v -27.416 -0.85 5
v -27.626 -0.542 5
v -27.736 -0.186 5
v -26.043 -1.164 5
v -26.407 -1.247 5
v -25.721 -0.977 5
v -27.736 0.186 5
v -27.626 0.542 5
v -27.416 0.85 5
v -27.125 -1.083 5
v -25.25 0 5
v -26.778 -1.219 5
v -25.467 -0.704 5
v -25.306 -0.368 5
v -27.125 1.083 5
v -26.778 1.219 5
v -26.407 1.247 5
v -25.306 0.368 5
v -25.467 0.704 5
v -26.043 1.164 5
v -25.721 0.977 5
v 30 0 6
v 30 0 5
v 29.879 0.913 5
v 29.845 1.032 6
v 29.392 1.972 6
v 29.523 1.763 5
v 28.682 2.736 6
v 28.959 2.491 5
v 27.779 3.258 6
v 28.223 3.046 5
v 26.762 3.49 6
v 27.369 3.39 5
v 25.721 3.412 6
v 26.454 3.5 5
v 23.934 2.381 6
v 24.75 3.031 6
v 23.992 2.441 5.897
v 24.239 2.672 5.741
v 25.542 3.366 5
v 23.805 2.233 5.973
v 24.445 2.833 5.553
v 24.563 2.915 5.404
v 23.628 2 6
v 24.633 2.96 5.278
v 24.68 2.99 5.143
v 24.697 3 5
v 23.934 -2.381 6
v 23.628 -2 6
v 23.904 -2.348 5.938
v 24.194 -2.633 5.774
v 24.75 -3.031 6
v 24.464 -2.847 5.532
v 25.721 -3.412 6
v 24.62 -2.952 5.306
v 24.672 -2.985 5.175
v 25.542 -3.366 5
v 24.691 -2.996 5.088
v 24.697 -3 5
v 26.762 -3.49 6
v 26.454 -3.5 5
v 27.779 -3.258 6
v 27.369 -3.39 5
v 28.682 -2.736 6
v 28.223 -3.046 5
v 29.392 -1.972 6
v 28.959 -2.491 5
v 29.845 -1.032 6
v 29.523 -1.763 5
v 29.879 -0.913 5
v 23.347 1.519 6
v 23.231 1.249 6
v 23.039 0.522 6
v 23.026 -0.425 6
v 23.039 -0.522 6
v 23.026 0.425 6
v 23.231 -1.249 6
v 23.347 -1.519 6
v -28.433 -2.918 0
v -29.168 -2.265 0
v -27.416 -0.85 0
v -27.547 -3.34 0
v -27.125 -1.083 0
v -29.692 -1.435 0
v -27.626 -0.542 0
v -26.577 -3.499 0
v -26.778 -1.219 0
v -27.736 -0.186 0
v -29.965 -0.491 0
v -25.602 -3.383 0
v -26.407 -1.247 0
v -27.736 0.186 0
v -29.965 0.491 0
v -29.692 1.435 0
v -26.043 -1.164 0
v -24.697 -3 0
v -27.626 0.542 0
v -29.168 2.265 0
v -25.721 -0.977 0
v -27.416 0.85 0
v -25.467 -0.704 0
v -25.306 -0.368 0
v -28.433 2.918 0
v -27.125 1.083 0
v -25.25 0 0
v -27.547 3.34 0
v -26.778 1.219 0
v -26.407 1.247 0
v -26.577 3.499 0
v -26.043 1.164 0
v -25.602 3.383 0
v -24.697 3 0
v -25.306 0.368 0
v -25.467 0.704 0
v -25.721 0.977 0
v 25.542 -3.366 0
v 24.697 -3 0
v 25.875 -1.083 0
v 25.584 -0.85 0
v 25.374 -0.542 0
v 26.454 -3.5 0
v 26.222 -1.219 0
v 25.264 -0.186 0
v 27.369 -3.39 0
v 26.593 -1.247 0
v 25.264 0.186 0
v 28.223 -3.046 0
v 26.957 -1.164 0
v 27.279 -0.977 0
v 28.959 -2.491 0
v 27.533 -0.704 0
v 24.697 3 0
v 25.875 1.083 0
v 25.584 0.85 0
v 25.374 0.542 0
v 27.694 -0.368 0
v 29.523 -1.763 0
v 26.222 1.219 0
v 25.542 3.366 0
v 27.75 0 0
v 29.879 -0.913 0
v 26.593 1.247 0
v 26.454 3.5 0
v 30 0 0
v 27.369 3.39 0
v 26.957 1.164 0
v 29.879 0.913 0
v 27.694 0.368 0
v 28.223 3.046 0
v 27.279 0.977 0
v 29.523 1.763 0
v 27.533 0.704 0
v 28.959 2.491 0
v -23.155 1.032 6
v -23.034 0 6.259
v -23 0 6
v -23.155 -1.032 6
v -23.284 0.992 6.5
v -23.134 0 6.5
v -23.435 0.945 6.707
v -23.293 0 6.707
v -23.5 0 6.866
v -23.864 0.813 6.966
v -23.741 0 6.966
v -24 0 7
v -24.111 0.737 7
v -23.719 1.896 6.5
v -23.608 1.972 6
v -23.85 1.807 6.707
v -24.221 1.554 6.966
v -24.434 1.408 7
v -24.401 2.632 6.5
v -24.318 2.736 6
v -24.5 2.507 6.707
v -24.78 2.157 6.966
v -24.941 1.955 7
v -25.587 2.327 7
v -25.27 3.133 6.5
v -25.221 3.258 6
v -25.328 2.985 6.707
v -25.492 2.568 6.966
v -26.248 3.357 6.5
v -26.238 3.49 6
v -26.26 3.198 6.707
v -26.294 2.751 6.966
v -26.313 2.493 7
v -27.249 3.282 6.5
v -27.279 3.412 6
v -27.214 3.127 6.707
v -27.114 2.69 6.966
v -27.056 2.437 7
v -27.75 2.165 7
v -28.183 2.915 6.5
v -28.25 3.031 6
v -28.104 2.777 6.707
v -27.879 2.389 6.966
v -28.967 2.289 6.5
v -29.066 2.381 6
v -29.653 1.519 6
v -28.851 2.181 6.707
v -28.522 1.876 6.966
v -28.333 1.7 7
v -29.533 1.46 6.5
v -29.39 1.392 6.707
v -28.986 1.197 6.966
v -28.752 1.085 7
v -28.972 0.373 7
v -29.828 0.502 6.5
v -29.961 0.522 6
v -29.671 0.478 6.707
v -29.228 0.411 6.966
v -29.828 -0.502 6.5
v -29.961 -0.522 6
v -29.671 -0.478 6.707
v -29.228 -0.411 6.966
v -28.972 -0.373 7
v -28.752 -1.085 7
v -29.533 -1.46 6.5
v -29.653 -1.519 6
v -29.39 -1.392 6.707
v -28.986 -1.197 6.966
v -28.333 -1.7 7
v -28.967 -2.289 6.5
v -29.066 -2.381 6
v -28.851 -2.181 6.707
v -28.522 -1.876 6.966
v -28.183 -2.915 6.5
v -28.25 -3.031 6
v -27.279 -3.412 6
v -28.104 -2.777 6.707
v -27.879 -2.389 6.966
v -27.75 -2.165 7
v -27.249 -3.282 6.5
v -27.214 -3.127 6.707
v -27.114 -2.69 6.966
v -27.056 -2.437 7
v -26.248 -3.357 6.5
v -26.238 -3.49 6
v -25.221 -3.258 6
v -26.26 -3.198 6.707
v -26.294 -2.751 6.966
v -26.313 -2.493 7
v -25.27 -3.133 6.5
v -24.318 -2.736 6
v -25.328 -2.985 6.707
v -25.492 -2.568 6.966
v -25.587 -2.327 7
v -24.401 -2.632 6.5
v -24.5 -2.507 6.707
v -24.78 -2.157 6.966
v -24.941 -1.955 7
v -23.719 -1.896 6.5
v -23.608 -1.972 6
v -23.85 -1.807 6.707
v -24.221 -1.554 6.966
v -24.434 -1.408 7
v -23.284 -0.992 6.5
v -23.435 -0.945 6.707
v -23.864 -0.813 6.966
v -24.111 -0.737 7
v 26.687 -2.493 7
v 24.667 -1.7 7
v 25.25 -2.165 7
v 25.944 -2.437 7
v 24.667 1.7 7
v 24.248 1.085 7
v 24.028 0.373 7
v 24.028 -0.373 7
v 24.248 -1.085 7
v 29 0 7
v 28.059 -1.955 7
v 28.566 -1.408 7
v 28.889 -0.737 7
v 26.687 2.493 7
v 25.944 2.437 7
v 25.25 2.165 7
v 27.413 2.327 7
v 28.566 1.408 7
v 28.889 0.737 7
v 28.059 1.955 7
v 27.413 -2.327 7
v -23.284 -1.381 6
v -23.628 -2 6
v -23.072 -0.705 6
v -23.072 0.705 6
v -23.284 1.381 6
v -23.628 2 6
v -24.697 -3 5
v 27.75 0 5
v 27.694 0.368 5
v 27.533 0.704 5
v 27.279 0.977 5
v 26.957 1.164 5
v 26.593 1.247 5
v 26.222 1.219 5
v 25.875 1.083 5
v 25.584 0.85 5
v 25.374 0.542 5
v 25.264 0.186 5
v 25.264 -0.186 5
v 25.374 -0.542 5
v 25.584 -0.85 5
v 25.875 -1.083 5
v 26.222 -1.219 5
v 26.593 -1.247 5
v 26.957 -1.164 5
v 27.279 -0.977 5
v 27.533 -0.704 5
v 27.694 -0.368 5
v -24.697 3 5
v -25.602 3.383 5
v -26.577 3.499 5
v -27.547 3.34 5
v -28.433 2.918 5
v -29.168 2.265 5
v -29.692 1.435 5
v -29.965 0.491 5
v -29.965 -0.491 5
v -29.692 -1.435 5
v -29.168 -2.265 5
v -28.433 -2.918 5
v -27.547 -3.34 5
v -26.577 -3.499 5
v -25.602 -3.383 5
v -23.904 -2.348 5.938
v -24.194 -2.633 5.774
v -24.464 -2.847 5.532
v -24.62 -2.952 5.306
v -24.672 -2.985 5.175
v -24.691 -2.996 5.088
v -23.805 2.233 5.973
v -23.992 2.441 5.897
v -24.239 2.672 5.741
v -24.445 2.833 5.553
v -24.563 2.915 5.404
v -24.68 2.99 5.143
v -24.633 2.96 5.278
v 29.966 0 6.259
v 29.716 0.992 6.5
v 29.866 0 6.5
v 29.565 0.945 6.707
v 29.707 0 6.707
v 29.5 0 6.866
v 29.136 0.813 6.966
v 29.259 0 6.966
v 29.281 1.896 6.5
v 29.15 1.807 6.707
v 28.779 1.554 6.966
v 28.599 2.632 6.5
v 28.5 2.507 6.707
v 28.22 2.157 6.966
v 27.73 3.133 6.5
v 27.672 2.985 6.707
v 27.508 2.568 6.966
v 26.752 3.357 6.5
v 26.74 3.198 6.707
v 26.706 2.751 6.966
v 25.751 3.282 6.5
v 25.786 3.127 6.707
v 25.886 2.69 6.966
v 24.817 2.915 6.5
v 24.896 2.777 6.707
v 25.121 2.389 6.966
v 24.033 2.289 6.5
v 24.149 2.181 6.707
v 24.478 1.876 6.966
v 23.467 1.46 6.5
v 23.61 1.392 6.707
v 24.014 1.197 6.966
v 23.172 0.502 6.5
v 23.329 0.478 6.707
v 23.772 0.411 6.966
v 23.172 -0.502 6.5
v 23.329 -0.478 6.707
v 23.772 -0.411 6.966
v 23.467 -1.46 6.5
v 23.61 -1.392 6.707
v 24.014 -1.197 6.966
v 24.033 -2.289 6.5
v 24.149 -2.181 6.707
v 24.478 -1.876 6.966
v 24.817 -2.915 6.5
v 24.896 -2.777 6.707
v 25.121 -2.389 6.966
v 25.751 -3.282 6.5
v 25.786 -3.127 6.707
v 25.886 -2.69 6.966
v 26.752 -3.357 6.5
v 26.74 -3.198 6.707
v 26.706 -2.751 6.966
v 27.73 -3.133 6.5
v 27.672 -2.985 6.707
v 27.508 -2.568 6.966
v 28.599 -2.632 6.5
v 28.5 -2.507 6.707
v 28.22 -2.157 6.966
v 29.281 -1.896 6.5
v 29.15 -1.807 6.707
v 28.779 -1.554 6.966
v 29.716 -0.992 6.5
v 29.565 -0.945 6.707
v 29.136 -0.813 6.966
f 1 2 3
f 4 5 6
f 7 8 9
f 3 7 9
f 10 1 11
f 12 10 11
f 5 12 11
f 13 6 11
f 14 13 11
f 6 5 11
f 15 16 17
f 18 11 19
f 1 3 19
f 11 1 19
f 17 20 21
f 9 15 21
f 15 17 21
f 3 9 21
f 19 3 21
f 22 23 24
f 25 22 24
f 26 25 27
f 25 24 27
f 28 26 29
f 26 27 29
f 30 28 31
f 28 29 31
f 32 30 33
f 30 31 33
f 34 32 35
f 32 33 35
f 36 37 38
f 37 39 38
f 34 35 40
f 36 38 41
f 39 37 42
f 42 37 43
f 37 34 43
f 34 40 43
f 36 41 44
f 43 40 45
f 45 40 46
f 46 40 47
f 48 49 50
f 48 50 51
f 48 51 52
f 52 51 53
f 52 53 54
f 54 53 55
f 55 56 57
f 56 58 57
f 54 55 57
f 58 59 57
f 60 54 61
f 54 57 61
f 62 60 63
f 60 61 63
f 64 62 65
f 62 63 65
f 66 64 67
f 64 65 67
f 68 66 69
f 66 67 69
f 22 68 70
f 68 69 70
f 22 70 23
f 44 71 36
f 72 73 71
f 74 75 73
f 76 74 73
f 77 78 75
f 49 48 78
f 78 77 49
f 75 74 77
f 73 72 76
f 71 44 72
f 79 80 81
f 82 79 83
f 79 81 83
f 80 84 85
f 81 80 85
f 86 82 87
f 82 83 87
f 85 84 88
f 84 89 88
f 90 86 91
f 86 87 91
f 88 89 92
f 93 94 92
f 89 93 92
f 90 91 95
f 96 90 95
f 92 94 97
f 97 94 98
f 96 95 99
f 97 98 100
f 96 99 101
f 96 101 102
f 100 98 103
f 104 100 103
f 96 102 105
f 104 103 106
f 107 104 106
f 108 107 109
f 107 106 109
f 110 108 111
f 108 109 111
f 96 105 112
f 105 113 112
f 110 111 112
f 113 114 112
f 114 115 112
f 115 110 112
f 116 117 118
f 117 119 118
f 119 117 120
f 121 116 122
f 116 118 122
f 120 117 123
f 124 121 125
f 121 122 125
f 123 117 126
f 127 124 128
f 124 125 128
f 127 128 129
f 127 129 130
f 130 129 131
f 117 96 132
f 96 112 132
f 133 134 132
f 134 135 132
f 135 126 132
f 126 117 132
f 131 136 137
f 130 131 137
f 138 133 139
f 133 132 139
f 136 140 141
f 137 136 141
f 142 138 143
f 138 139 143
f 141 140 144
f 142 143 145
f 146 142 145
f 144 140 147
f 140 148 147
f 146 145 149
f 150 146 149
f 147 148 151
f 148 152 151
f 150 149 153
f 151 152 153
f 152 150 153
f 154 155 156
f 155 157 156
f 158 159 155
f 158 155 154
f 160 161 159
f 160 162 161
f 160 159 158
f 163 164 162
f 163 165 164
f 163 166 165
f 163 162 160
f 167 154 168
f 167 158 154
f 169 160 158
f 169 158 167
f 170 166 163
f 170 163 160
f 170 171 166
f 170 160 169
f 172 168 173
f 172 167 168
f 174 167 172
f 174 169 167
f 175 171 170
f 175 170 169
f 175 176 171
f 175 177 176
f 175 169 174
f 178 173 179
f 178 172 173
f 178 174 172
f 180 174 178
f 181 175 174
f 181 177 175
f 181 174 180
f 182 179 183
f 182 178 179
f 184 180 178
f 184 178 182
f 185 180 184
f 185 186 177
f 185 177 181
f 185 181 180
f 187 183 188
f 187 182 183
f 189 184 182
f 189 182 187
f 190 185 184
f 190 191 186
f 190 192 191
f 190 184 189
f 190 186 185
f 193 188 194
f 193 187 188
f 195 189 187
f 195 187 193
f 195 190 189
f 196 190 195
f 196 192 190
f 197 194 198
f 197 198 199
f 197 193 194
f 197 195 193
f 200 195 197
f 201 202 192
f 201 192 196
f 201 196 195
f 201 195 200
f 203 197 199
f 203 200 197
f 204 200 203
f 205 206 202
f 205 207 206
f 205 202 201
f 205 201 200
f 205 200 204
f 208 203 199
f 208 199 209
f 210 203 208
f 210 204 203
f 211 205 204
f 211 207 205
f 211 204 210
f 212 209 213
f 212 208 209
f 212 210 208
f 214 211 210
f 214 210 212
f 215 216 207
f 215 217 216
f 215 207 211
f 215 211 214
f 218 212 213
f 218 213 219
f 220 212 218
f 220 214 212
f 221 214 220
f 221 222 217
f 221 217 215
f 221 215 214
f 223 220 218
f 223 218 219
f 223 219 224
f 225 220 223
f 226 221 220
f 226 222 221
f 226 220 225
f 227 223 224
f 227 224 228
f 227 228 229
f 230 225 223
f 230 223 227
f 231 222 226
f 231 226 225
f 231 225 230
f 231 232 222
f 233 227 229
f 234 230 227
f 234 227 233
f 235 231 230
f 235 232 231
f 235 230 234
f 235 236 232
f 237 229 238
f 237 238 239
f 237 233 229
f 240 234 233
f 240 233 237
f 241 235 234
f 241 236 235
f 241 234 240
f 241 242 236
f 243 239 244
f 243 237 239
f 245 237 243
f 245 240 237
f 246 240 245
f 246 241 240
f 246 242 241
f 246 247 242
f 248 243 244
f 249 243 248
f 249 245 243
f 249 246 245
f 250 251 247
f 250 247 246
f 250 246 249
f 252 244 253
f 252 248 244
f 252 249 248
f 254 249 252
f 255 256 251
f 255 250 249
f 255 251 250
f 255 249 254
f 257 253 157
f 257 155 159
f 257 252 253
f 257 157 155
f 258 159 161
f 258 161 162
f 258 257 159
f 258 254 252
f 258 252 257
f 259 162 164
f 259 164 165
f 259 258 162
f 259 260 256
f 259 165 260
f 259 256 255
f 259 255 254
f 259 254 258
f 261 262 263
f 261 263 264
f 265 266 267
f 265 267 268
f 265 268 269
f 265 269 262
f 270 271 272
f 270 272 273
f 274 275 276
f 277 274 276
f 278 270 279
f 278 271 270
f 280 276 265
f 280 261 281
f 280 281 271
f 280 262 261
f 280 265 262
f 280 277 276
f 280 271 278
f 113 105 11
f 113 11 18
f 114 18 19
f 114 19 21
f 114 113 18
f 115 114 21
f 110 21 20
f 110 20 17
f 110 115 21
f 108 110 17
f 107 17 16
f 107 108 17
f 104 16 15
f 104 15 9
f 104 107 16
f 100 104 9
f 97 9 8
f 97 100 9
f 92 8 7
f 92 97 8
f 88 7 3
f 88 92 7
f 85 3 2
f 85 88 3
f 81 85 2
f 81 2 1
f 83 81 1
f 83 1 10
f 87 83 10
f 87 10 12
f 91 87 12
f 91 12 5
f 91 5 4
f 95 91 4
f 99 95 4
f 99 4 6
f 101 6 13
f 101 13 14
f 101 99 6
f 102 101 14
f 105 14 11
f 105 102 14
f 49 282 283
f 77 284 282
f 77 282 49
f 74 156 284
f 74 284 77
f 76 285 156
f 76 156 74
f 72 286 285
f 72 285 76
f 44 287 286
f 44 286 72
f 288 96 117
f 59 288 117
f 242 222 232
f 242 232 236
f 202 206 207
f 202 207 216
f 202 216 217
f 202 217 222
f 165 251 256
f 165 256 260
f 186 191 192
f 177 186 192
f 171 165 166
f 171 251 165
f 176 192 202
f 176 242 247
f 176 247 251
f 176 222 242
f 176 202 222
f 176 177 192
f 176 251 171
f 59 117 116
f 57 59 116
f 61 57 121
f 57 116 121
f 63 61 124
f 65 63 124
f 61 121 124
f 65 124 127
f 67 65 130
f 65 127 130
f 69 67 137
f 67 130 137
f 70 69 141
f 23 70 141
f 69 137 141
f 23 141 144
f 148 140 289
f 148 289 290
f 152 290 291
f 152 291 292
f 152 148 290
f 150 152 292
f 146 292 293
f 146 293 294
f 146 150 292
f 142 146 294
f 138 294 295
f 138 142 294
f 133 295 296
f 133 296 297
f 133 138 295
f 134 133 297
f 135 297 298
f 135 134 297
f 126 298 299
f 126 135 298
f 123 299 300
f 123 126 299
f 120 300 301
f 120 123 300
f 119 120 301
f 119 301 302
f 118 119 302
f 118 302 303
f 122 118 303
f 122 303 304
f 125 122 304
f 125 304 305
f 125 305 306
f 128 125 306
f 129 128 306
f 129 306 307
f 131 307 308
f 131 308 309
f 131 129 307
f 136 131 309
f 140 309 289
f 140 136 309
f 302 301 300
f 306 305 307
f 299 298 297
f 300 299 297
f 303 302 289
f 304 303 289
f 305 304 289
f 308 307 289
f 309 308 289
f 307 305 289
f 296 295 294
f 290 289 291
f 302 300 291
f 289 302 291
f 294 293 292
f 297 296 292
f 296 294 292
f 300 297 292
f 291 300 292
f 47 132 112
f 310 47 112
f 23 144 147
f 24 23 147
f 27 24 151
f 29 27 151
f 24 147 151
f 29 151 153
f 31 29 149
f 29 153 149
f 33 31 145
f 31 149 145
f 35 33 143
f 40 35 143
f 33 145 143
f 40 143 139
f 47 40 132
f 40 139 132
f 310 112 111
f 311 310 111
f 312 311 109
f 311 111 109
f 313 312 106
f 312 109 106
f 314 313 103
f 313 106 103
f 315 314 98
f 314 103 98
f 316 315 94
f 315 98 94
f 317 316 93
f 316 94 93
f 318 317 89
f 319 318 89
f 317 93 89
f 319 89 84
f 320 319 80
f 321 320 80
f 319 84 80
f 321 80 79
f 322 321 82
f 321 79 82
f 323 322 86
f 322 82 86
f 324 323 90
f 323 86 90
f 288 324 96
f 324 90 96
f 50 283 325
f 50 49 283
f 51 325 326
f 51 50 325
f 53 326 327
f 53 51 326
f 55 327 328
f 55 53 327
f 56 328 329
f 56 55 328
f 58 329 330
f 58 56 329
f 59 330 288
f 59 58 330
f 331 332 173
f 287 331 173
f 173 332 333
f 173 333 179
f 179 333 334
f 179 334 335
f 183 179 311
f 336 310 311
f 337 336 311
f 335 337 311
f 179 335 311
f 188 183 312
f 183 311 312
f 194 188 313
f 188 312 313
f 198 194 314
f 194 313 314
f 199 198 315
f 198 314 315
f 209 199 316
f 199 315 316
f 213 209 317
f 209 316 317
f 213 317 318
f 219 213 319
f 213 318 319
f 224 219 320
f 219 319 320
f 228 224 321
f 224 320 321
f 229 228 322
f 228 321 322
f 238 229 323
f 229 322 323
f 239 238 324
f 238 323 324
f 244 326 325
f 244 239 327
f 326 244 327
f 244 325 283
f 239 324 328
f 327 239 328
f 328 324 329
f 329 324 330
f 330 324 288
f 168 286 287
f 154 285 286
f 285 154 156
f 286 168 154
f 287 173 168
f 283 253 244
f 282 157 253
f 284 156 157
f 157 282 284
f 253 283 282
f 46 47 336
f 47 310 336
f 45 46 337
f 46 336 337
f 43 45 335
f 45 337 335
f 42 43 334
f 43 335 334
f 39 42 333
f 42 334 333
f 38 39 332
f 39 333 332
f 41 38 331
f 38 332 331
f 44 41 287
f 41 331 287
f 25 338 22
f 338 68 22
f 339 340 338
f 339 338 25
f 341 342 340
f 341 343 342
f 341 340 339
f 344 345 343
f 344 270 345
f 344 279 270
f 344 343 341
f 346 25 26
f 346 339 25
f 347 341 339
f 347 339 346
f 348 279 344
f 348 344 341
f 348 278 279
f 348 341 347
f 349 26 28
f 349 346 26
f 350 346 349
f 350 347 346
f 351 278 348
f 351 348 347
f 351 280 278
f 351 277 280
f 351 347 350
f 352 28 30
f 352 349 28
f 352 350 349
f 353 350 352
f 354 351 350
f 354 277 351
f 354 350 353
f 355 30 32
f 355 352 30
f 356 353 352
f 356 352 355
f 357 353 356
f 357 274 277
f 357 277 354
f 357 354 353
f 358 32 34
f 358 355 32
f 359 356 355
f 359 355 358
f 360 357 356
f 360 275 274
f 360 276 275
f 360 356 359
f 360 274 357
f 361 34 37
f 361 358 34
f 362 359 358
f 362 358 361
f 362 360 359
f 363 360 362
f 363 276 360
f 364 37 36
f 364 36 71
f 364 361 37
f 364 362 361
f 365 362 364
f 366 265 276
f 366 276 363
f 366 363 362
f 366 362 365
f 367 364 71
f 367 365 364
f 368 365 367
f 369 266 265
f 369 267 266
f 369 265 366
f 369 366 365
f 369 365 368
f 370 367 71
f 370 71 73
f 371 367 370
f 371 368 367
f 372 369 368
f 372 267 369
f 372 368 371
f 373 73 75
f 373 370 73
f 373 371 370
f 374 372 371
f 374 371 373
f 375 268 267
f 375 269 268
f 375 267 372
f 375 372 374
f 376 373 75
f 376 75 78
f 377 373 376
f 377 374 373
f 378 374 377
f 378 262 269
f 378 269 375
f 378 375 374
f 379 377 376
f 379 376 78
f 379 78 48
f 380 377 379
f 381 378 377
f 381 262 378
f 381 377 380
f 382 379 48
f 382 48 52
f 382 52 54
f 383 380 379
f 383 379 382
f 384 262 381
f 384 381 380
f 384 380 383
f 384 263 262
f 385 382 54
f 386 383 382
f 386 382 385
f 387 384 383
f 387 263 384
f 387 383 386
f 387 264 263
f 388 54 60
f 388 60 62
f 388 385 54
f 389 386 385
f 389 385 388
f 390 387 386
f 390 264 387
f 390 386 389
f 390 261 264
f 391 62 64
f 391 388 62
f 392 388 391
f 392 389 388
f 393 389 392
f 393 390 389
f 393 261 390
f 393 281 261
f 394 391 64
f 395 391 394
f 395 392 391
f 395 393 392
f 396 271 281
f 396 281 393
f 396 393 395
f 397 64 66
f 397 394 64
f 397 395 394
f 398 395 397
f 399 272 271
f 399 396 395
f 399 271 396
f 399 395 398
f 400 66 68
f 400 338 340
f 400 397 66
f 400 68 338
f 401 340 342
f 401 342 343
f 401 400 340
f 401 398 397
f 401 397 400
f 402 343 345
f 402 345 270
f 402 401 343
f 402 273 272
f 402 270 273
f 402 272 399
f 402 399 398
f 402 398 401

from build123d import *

# Parameters (mm, degrees)
F0_R     = 1.25
F1_DEPTH = 5
F2_DEPTH = 6
F3_R     = 3.5
F4_DEPTH = 2
F5_R     = 3.5
F6_DEPTH = 2
F7_R     = 0.99999


# Not quite as in the source:
# - a fillet or chamfer is up to 0.001 mm smaller than in the source, because OpenCascade refuses the exact size


with BuildPart() as f1:
    # F0 (on Top) → F1 (new body)
    with BuildSketch(Plane.XY):
        with BuildLine():
            ThreePointArc((-24.6972243623, -3), (-23.4537141687, -1.7234101758), (-23, 0))
            ThreePointArc((-23, 0), (-23.4537141687, 1.7234101758), (-24.6972243623, 3))
            ThreePointArc((-24.6972243623, 3), (-30, 0), (-24.6972243623, -3))
        make_face()
        with Locations((-26.5, 0)):
            Circle(F0_R, mode=Mode.SUBTRACT)
    extrude(amount=F1_DEPTH)



with BuildPart() as f1b:
    # F0 (on Top) → F1, piece 2 (new body)
    with BuildSketch(Plane.XY):
        with BuildLine():
            ThreePointArc((30, 0), (28.2234101758, 3.0462858313), (24.6972243623, 3))
            ThreePointArc((24.6972243623, 3), (23, 0), (24.6972243623, -3))
            ThreePointArc((24.6972243623, -3), (28.2234101758, -3.0462858313), (30, 0))
        make_face()
        with Locations((26.5, 0)):
            Circle(F0_R, mode=Mode.SUBTRACT)
    extrude(amount=F1_DEPTH)


with BuildPart() as f1_1:
    add(f1.part)

    add(f1b.part)  # F2 merges F1b
    # F0 (on Top) → F2 (join)
    with BuildSketch(Plane.XY):
        with BuildLine():
            ThreePointArc((-24.6972243623, 3), (-23.4537141687, 1.7234101758), (-23, 0))
            ThreePointArc((-23, 0), (-23.4537141687, -1.7234101758), (-24.6972243623, -3))
            Line((-24.6972243623, -3), (24.6972243623, -3))
            ThreePointArc((24.6972243623, -3), (23, 0), (24.6972243623, 3))
            Line((24.6972243623, 3), (-24.6972243623, 3))
        make_face()
    extrude(amount=F2_DEPTH)

    # F3 (on face) → F4 (join)
    with BuildSketch(Plane.XY.offset(5)):
        with Locations((-26.5, 0)):
            Circle(F3_R)
    extrude(amount=F4_DEPTH)

    # F5 (on face) → F6 (join)
    with BuildSketch(Plane.XY.offset(5)):
        with Locations((26.5, 0)):
            Circle(F5_R)
    extrude(amount=F6_DEPTH)

    # F7 (radius 1 in the source; OpenCascade refuses exactly that, so slightly less here)
    f7_edges = [f1_1.edges().sort_by_distance(p)[0] for p in [
        (0, 3, 6),
        (0, -3, 6),
        (23, 0, 7),
        (-30, 0, 7),
    ]]
    fillet(f7_edges, radius=F7_R)


solid = f1_1.part
